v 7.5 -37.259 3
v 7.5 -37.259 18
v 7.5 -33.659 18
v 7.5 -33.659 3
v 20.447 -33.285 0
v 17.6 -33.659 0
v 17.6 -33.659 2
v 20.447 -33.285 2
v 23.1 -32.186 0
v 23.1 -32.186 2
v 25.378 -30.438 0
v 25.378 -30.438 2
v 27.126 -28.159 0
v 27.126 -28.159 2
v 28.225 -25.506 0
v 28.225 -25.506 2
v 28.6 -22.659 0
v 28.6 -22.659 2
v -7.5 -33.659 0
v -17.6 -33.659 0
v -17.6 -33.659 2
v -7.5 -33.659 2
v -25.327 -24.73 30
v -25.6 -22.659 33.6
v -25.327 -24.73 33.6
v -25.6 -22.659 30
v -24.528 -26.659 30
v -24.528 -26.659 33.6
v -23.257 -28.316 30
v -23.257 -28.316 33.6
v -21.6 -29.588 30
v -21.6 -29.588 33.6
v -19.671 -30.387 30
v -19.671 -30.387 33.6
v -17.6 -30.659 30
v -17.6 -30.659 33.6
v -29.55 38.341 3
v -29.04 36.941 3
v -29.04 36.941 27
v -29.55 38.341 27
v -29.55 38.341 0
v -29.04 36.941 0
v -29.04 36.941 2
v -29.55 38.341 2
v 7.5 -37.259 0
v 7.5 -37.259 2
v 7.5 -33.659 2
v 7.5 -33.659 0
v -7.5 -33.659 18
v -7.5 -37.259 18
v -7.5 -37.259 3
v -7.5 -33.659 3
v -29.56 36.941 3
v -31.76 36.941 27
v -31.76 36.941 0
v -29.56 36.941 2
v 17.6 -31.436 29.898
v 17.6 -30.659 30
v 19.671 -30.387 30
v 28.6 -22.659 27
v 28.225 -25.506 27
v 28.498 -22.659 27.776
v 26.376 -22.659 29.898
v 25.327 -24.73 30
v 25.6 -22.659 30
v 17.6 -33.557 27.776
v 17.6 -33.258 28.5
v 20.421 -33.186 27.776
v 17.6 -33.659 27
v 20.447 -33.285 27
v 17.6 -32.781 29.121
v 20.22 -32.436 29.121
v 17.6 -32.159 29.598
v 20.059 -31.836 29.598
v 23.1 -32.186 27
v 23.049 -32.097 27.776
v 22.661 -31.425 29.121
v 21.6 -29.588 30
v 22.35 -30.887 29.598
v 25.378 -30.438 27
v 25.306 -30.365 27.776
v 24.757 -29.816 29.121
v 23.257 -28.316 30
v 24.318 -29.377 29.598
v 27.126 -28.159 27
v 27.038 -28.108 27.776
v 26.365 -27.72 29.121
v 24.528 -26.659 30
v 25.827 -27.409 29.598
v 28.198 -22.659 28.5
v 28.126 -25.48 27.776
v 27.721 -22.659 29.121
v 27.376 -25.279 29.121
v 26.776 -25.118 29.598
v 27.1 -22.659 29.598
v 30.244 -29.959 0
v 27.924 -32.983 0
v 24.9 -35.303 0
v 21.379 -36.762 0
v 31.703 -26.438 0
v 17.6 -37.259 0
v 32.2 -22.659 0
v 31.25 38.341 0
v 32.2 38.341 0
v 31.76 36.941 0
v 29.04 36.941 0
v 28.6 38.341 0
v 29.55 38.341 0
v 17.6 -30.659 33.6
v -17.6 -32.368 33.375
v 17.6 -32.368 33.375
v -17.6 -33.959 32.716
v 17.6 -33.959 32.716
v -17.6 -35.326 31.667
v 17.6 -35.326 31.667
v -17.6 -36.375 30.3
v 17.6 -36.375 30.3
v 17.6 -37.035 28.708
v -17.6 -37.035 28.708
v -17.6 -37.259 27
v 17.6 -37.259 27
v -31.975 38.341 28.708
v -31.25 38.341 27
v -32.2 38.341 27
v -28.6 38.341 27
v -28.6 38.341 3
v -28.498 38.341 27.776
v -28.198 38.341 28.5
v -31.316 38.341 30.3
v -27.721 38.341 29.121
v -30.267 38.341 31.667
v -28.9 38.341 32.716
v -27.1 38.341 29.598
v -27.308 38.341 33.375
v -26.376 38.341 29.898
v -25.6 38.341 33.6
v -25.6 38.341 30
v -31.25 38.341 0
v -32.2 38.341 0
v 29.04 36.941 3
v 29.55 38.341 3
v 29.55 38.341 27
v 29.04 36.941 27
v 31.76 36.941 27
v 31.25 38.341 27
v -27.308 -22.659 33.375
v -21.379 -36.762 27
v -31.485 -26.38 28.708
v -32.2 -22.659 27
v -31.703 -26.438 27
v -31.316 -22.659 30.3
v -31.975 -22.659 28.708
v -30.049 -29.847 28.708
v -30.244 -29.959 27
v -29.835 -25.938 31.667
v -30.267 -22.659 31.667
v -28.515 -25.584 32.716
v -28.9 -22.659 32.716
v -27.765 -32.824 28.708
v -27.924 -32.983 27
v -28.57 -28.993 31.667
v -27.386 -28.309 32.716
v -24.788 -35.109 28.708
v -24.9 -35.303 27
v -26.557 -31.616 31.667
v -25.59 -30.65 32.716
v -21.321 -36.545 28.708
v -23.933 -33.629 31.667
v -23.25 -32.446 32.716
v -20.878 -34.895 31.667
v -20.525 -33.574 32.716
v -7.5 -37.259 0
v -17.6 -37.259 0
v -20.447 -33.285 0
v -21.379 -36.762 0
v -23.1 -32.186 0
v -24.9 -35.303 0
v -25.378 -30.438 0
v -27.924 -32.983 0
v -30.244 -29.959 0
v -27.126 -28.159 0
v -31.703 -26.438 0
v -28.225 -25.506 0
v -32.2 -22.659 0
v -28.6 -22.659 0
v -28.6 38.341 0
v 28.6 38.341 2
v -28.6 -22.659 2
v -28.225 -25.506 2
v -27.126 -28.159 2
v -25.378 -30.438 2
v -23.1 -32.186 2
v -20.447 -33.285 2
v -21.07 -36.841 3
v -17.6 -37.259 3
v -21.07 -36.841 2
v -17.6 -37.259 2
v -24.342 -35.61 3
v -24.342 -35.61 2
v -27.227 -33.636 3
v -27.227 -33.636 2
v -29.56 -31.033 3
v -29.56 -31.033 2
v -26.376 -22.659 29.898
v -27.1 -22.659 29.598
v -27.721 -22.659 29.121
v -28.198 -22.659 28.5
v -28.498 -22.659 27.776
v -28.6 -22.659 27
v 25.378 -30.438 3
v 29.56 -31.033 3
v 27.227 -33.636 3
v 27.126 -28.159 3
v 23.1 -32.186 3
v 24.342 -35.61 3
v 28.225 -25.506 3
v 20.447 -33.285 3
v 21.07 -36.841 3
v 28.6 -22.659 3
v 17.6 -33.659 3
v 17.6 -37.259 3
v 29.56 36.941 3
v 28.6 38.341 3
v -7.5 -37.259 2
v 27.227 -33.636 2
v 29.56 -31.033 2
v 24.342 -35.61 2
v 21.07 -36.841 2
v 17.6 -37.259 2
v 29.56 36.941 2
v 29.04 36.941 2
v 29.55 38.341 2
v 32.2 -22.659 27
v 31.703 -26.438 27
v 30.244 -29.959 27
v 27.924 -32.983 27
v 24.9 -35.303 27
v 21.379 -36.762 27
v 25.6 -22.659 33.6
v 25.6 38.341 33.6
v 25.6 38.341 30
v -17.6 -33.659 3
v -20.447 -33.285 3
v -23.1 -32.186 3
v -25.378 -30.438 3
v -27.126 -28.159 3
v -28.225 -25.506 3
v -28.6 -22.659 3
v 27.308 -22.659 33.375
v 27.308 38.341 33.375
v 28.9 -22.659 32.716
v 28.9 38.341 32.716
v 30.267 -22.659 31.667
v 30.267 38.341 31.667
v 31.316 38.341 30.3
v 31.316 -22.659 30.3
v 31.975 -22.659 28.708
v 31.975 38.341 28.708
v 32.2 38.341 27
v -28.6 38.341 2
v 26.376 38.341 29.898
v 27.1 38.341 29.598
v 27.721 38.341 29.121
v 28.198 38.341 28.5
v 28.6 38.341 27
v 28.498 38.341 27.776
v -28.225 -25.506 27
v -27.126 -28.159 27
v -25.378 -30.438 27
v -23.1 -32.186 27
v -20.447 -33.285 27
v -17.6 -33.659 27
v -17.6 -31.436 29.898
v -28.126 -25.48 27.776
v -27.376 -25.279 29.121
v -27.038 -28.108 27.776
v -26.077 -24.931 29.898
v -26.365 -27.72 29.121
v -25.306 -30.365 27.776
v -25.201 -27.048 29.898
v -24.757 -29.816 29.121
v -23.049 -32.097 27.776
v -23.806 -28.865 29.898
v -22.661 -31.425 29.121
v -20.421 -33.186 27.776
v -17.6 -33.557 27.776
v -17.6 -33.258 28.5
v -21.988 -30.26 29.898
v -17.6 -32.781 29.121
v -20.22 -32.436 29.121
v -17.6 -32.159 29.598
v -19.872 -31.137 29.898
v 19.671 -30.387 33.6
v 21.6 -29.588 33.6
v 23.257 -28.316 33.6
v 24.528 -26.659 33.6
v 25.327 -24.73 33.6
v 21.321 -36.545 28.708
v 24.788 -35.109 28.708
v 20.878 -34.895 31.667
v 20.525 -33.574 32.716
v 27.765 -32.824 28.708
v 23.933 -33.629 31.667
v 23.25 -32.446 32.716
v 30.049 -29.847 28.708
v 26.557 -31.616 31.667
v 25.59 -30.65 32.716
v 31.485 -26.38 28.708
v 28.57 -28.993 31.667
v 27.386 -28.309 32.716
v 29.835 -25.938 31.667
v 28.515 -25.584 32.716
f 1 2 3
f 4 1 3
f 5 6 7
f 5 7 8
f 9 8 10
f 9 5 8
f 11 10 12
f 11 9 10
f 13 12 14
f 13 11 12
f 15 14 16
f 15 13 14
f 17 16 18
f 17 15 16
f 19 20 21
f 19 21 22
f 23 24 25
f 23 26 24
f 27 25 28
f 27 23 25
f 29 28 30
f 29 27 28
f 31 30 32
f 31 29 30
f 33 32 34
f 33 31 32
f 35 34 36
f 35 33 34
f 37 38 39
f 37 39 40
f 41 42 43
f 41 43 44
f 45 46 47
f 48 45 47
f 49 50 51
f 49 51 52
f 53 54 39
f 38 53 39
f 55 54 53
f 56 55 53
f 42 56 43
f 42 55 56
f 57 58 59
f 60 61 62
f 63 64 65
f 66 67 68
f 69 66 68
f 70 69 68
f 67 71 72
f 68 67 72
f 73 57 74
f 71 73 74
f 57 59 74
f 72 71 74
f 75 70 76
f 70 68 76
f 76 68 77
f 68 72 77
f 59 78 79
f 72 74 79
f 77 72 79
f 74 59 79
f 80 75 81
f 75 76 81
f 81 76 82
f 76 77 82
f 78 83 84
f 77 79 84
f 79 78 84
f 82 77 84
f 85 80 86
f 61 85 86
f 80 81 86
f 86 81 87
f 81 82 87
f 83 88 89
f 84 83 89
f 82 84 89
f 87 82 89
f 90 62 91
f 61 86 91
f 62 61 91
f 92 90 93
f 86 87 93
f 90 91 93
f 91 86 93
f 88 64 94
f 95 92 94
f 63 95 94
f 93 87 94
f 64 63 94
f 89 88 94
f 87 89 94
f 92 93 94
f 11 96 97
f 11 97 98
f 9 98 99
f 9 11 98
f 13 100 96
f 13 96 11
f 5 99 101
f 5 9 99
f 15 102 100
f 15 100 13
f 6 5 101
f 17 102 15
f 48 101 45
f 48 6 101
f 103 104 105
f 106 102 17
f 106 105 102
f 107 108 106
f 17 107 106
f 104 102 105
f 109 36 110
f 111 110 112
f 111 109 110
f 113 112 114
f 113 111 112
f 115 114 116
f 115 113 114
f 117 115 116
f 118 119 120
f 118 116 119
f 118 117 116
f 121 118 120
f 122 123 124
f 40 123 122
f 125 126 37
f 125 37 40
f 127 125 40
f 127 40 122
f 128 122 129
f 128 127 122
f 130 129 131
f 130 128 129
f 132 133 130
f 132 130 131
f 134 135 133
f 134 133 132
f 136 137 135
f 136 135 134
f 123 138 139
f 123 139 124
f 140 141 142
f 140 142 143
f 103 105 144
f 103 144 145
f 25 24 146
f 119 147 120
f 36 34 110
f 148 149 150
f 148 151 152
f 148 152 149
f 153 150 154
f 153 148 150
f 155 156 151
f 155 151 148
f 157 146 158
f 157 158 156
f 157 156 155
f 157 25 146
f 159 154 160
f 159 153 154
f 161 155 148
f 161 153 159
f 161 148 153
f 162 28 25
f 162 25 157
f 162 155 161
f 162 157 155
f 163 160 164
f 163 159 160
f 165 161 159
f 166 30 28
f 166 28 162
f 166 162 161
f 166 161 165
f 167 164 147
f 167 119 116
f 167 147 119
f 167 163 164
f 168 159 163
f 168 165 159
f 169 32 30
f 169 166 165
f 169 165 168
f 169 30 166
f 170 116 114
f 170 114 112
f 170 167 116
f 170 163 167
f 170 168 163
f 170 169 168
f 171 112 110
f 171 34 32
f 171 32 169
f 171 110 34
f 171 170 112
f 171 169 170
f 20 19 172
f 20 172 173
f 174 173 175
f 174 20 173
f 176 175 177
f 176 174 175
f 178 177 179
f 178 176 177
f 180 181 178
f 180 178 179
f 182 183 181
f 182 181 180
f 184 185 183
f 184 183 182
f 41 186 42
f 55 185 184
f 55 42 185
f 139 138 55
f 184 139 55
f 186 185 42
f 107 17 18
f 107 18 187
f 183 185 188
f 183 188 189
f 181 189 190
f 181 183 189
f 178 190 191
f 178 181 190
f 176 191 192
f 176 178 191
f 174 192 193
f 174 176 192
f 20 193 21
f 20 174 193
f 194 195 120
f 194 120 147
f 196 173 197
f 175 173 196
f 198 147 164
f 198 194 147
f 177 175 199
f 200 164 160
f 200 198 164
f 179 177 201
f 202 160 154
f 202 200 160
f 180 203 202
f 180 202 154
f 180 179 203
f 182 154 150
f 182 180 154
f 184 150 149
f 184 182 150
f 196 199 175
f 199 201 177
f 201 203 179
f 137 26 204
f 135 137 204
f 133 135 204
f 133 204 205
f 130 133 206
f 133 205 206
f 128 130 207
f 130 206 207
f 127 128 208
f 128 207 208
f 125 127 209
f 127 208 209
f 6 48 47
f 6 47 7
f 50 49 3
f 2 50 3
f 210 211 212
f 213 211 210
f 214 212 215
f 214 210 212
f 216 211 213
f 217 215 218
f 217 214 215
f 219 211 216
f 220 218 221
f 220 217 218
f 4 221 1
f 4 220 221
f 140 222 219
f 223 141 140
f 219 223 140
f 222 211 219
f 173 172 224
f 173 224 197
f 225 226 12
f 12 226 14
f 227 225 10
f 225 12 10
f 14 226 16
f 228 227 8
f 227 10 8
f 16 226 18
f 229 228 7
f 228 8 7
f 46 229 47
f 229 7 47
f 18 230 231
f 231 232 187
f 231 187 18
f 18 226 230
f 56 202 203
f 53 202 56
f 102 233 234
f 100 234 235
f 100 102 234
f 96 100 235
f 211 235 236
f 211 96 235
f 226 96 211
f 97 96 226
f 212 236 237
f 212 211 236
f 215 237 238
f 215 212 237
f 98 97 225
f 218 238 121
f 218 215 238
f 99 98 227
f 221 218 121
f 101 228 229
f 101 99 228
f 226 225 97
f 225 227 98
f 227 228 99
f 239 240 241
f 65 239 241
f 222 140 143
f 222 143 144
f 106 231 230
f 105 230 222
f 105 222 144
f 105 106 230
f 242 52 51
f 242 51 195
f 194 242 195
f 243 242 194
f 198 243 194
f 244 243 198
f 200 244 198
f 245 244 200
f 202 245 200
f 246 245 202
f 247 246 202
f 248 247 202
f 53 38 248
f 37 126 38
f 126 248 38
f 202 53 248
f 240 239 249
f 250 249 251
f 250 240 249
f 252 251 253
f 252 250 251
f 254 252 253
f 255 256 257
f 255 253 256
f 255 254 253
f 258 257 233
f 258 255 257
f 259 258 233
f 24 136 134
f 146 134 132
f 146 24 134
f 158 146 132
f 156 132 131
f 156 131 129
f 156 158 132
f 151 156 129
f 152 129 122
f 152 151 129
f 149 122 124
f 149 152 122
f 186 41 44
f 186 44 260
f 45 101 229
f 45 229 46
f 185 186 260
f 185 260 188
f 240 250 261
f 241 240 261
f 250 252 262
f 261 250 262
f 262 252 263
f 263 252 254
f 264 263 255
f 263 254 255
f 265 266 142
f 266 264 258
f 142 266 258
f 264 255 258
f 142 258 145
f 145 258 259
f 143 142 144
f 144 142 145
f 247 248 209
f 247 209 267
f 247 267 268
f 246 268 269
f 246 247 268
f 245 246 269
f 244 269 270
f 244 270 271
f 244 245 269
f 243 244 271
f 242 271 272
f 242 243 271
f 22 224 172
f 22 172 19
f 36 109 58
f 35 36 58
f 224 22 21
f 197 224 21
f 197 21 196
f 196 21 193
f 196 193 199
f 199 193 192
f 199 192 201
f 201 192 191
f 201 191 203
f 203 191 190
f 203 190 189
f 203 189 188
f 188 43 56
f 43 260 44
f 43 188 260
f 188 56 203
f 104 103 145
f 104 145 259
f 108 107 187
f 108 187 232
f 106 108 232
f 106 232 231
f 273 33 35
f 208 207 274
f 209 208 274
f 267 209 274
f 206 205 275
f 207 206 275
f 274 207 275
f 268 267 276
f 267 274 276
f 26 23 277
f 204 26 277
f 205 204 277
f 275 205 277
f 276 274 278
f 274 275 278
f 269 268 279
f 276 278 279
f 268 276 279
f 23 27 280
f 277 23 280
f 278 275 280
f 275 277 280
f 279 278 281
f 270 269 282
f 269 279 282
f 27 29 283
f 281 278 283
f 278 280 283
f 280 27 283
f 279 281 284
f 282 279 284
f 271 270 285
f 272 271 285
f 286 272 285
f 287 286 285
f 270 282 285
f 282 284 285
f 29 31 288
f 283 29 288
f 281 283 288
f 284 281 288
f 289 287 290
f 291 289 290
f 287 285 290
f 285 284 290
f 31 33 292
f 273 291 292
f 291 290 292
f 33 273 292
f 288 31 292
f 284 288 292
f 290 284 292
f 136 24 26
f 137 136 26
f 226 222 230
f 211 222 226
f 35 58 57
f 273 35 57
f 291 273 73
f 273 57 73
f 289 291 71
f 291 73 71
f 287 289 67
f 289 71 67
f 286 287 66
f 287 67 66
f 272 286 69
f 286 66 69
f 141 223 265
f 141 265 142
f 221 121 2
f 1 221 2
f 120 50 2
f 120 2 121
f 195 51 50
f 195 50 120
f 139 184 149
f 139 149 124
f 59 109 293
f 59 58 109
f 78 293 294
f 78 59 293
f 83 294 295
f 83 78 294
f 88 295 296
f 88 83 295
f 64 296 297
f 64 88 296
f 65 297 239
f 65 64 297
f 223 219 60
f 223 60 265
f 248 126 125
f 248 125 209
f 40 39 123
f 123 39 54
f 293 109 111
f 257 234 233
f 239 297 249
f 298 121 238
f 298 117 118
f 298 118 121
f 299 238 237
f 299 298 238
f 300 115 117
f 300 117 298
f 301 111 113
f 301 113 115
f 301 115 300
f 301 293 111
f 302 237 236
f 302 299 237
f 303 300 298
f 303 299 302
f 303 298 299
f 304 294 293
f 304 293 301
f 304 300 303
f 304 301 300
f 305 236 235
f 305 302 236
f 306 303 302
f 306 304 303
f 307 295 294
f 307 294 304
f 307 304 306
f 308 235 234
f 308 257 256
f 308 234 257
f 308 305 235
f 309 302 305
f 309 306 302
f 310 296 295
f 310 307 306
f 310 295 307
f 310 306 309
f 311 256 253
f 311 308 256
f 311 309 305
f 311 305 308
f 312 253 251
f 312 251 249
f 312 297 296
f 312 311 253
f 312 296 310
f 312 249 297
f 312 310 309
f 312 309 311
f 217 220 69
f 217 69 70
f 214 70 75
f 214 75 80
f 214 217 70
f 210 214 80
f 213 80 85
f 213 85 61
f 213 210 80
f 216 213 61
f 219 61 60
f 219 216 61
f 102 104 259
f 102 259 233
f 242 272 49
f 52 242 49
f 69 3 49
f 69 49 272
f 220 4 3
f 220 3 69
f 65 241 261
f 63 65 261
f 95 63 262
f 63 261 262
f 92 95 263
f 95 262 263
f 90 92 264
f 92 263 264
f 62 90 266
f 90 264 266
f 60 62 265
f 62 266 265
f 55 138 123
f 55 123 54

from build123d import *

# Parameters (mm, degrees)
EXTRUDE_1_DEPTH     = 27
CUT_EXTRUDE_START   = -1
CUT_EXTRUDE_1_DEPTH = 1
SKETCH_4_W          = 15
SKETCH_4_H          = 3.6
CUT_EXTRUDE_2_DEPTH = 55.688566867
SKETCH_4_2_W        = 15
SKETCH_4_2_H        = 3.6
CUT_EXTRUDE_3_DEPTH = 13


with BuildPart() as part:
    # 草圖1 → 填料-伸長1 (new body)
    with BuildSketch(Plane.XY):
        with BuildLine():
            Line((-17.6, -33.659429503), (17.6, -33.659429503))
            ThreePointArc((17.6, -33.659429503), (25.378174593, -30.437604096), (28.6, -22.659429503))
            Line((28.6, -22.659429503), (28.6, 38.340570497))
            Line((28.6, 38.340570497), (29.55, 38.340570497))
            Line((29.55, 38.340570497), (29.040441672, 36.940570497))
            Line((29.040441672, 36.940570497), (31.759558328, 36.940570497))
            Line((31.759558328, 36.940570497), (31.25, 38.340570497))
            Line((31.25, 38.340570497), (32.2, 38.340570497))
            Line((32.2, 38.340570497), (32.2, -22.659429503))
            ThreePointArc((32.2, -22.659429503), (27.923759005, -32.983188509), (17.6, -37.259429503))
            Line((17.6, -37.259429503), (-17.6, -37.259429503))
            ThreePointArc((-17.6, -37.259429503), (-27.923759005, -32.983188509), (-32.2, -22.659429503))
            Line((-32.2, -22.659429503), (-32.2, 38.340570497))
            Line((-32.2, 38.340570497), (-31.25, 38.340570497))
            Line((-31.25, 38.340570497), (-31.759558328, 36.940570497))
            Line((-31.759558328, 36.940570497), (-29.040441672, 36.940570497))
            Line((-29.040441672, 36.940570497), (-29.55, 38.340570497))
            Line((-29.55, 38.340570497), (-28.6, 38.340570497))
            Line((-28.6, 38.340570497), (-28.6, -22.659429503))
            ThreePointArc((-28.6, -22.659429503), (-25.378174593, -30.437604096), (-17.6, -33.659429503))
        make_face()
    extrude(amount=EXTRUDE_1_DEPTH)

    # 草圖3 → 除料-伸長1 (cut)
    with BuildSketch(Plane.XY.offset(3).offset(CUT_EXTRUDE_START)):
        with BuildLine():
            Line((-28.6, 38.340570497), (-28.6, -22.659429503))
            ThreePointArc((-28.6, -22.659429503), (-25.378174593, -30.437604096), (-17.6, -33.659429503))
            Line((-17.6, -33.659429503), (17.6, -33.659429503))
            ThreePointArc((17.6, -33.659429503), (25.378174593, -30.437604096), (28.6, -22.659429503))
            Line((28.6, -22.659429503), (28.6, 38.340570497))
            Line((28.6, 38.340570497), (29.56, 38.340570497))
            Line((29.56, 38.340570497), (29.56, -22.659429503))
            Line((29.56, -22.659429503), (29.56, -37.259429503))
            Line((29.56, -37.259429503), (-29.56, -37.259429503))
            Line((-29.56, -37.259429503), (-29.56, -22.659429503))
            Line((-29.56, -22.659429503), (-29.56, 38.340570497))
            Line((-29.56, 38.340570497), (-28.6, 38.340570497))
        make_face()
    extrude(amount=CUT_EXTRUDE_1_DEPTH, mode=Mode.SUBTRACT)

    # 草圖4 → 除料-伸長2 (cut, through all)
    with BuildSketch(Plane.XY.offset(5)):
        with Locations((0, -35.459429503)):
            Rectangle(SKETCH_4_W, SKETCH_4_H)
    extrude(amount=-CUT_EXTRUDE_2_DEPTH, mode=Mode.SUBTRACT)

    # 掃出4: sweep along a path in 草圖6
    with BuildLine(Plane.XY.offset(27)) as sweep_4_path:
        Line((-30.4, 38.340570497), (-30.4, 37.968733181))
        Line((-30.4, 37.968733181), (-30.4, -22.659429503))
        ThreePointArc((-30.4, -22.659429503), (-26.650966799, -31.710396303), (-17.6, -35.459429503))
        Line((-17.6, -35.459429503), (17.6, -35.459429503))
        ThreePointArc((17.6, -35.459429503), (26.650966799, -31.710396303), (30.4, -22.659429503))
        Line((30.4, -22.659429503), (30.4, 37.968733181))
        Line((30.4, 37.968733181), (30.4, 38.340570497))
    # 草圖7 → 掃出4 (sweep)
    with BuildSketch(Plane(origin=(0, 36.940570497, 0), x_dir=(1, 0, 0), z_dir=(0, 1, 0))):
        with BuildLine():
            Line((-32.2, -27), (-28.6, -27))
            ThreePointArc((-28.6, -27), (-27.721320344, -29.121320344), (-25.6, -30))
            Line((-25.6, -30), (-25.6, -33.6))
            ThreePointArc((-25.6, -33.6), (-30.266904756, -31.666904756), (-32.2, -27))
        make_face()
    sweep(path=sweep_4_path.line)

    # 草圖4<2> → 除料-伸長3 (cut)
    with BuildSketch(Plane.XY.offset(5)):
        with Locations((0, -35.459429503)):
            Rectangle(SKETCH_4_2_W, SKETCH_4_2_H)
    extrude(amount=CUT_EXTRUDE_3_DEPTH, mode=Mode.SUBTRACT)


solid = part.part
